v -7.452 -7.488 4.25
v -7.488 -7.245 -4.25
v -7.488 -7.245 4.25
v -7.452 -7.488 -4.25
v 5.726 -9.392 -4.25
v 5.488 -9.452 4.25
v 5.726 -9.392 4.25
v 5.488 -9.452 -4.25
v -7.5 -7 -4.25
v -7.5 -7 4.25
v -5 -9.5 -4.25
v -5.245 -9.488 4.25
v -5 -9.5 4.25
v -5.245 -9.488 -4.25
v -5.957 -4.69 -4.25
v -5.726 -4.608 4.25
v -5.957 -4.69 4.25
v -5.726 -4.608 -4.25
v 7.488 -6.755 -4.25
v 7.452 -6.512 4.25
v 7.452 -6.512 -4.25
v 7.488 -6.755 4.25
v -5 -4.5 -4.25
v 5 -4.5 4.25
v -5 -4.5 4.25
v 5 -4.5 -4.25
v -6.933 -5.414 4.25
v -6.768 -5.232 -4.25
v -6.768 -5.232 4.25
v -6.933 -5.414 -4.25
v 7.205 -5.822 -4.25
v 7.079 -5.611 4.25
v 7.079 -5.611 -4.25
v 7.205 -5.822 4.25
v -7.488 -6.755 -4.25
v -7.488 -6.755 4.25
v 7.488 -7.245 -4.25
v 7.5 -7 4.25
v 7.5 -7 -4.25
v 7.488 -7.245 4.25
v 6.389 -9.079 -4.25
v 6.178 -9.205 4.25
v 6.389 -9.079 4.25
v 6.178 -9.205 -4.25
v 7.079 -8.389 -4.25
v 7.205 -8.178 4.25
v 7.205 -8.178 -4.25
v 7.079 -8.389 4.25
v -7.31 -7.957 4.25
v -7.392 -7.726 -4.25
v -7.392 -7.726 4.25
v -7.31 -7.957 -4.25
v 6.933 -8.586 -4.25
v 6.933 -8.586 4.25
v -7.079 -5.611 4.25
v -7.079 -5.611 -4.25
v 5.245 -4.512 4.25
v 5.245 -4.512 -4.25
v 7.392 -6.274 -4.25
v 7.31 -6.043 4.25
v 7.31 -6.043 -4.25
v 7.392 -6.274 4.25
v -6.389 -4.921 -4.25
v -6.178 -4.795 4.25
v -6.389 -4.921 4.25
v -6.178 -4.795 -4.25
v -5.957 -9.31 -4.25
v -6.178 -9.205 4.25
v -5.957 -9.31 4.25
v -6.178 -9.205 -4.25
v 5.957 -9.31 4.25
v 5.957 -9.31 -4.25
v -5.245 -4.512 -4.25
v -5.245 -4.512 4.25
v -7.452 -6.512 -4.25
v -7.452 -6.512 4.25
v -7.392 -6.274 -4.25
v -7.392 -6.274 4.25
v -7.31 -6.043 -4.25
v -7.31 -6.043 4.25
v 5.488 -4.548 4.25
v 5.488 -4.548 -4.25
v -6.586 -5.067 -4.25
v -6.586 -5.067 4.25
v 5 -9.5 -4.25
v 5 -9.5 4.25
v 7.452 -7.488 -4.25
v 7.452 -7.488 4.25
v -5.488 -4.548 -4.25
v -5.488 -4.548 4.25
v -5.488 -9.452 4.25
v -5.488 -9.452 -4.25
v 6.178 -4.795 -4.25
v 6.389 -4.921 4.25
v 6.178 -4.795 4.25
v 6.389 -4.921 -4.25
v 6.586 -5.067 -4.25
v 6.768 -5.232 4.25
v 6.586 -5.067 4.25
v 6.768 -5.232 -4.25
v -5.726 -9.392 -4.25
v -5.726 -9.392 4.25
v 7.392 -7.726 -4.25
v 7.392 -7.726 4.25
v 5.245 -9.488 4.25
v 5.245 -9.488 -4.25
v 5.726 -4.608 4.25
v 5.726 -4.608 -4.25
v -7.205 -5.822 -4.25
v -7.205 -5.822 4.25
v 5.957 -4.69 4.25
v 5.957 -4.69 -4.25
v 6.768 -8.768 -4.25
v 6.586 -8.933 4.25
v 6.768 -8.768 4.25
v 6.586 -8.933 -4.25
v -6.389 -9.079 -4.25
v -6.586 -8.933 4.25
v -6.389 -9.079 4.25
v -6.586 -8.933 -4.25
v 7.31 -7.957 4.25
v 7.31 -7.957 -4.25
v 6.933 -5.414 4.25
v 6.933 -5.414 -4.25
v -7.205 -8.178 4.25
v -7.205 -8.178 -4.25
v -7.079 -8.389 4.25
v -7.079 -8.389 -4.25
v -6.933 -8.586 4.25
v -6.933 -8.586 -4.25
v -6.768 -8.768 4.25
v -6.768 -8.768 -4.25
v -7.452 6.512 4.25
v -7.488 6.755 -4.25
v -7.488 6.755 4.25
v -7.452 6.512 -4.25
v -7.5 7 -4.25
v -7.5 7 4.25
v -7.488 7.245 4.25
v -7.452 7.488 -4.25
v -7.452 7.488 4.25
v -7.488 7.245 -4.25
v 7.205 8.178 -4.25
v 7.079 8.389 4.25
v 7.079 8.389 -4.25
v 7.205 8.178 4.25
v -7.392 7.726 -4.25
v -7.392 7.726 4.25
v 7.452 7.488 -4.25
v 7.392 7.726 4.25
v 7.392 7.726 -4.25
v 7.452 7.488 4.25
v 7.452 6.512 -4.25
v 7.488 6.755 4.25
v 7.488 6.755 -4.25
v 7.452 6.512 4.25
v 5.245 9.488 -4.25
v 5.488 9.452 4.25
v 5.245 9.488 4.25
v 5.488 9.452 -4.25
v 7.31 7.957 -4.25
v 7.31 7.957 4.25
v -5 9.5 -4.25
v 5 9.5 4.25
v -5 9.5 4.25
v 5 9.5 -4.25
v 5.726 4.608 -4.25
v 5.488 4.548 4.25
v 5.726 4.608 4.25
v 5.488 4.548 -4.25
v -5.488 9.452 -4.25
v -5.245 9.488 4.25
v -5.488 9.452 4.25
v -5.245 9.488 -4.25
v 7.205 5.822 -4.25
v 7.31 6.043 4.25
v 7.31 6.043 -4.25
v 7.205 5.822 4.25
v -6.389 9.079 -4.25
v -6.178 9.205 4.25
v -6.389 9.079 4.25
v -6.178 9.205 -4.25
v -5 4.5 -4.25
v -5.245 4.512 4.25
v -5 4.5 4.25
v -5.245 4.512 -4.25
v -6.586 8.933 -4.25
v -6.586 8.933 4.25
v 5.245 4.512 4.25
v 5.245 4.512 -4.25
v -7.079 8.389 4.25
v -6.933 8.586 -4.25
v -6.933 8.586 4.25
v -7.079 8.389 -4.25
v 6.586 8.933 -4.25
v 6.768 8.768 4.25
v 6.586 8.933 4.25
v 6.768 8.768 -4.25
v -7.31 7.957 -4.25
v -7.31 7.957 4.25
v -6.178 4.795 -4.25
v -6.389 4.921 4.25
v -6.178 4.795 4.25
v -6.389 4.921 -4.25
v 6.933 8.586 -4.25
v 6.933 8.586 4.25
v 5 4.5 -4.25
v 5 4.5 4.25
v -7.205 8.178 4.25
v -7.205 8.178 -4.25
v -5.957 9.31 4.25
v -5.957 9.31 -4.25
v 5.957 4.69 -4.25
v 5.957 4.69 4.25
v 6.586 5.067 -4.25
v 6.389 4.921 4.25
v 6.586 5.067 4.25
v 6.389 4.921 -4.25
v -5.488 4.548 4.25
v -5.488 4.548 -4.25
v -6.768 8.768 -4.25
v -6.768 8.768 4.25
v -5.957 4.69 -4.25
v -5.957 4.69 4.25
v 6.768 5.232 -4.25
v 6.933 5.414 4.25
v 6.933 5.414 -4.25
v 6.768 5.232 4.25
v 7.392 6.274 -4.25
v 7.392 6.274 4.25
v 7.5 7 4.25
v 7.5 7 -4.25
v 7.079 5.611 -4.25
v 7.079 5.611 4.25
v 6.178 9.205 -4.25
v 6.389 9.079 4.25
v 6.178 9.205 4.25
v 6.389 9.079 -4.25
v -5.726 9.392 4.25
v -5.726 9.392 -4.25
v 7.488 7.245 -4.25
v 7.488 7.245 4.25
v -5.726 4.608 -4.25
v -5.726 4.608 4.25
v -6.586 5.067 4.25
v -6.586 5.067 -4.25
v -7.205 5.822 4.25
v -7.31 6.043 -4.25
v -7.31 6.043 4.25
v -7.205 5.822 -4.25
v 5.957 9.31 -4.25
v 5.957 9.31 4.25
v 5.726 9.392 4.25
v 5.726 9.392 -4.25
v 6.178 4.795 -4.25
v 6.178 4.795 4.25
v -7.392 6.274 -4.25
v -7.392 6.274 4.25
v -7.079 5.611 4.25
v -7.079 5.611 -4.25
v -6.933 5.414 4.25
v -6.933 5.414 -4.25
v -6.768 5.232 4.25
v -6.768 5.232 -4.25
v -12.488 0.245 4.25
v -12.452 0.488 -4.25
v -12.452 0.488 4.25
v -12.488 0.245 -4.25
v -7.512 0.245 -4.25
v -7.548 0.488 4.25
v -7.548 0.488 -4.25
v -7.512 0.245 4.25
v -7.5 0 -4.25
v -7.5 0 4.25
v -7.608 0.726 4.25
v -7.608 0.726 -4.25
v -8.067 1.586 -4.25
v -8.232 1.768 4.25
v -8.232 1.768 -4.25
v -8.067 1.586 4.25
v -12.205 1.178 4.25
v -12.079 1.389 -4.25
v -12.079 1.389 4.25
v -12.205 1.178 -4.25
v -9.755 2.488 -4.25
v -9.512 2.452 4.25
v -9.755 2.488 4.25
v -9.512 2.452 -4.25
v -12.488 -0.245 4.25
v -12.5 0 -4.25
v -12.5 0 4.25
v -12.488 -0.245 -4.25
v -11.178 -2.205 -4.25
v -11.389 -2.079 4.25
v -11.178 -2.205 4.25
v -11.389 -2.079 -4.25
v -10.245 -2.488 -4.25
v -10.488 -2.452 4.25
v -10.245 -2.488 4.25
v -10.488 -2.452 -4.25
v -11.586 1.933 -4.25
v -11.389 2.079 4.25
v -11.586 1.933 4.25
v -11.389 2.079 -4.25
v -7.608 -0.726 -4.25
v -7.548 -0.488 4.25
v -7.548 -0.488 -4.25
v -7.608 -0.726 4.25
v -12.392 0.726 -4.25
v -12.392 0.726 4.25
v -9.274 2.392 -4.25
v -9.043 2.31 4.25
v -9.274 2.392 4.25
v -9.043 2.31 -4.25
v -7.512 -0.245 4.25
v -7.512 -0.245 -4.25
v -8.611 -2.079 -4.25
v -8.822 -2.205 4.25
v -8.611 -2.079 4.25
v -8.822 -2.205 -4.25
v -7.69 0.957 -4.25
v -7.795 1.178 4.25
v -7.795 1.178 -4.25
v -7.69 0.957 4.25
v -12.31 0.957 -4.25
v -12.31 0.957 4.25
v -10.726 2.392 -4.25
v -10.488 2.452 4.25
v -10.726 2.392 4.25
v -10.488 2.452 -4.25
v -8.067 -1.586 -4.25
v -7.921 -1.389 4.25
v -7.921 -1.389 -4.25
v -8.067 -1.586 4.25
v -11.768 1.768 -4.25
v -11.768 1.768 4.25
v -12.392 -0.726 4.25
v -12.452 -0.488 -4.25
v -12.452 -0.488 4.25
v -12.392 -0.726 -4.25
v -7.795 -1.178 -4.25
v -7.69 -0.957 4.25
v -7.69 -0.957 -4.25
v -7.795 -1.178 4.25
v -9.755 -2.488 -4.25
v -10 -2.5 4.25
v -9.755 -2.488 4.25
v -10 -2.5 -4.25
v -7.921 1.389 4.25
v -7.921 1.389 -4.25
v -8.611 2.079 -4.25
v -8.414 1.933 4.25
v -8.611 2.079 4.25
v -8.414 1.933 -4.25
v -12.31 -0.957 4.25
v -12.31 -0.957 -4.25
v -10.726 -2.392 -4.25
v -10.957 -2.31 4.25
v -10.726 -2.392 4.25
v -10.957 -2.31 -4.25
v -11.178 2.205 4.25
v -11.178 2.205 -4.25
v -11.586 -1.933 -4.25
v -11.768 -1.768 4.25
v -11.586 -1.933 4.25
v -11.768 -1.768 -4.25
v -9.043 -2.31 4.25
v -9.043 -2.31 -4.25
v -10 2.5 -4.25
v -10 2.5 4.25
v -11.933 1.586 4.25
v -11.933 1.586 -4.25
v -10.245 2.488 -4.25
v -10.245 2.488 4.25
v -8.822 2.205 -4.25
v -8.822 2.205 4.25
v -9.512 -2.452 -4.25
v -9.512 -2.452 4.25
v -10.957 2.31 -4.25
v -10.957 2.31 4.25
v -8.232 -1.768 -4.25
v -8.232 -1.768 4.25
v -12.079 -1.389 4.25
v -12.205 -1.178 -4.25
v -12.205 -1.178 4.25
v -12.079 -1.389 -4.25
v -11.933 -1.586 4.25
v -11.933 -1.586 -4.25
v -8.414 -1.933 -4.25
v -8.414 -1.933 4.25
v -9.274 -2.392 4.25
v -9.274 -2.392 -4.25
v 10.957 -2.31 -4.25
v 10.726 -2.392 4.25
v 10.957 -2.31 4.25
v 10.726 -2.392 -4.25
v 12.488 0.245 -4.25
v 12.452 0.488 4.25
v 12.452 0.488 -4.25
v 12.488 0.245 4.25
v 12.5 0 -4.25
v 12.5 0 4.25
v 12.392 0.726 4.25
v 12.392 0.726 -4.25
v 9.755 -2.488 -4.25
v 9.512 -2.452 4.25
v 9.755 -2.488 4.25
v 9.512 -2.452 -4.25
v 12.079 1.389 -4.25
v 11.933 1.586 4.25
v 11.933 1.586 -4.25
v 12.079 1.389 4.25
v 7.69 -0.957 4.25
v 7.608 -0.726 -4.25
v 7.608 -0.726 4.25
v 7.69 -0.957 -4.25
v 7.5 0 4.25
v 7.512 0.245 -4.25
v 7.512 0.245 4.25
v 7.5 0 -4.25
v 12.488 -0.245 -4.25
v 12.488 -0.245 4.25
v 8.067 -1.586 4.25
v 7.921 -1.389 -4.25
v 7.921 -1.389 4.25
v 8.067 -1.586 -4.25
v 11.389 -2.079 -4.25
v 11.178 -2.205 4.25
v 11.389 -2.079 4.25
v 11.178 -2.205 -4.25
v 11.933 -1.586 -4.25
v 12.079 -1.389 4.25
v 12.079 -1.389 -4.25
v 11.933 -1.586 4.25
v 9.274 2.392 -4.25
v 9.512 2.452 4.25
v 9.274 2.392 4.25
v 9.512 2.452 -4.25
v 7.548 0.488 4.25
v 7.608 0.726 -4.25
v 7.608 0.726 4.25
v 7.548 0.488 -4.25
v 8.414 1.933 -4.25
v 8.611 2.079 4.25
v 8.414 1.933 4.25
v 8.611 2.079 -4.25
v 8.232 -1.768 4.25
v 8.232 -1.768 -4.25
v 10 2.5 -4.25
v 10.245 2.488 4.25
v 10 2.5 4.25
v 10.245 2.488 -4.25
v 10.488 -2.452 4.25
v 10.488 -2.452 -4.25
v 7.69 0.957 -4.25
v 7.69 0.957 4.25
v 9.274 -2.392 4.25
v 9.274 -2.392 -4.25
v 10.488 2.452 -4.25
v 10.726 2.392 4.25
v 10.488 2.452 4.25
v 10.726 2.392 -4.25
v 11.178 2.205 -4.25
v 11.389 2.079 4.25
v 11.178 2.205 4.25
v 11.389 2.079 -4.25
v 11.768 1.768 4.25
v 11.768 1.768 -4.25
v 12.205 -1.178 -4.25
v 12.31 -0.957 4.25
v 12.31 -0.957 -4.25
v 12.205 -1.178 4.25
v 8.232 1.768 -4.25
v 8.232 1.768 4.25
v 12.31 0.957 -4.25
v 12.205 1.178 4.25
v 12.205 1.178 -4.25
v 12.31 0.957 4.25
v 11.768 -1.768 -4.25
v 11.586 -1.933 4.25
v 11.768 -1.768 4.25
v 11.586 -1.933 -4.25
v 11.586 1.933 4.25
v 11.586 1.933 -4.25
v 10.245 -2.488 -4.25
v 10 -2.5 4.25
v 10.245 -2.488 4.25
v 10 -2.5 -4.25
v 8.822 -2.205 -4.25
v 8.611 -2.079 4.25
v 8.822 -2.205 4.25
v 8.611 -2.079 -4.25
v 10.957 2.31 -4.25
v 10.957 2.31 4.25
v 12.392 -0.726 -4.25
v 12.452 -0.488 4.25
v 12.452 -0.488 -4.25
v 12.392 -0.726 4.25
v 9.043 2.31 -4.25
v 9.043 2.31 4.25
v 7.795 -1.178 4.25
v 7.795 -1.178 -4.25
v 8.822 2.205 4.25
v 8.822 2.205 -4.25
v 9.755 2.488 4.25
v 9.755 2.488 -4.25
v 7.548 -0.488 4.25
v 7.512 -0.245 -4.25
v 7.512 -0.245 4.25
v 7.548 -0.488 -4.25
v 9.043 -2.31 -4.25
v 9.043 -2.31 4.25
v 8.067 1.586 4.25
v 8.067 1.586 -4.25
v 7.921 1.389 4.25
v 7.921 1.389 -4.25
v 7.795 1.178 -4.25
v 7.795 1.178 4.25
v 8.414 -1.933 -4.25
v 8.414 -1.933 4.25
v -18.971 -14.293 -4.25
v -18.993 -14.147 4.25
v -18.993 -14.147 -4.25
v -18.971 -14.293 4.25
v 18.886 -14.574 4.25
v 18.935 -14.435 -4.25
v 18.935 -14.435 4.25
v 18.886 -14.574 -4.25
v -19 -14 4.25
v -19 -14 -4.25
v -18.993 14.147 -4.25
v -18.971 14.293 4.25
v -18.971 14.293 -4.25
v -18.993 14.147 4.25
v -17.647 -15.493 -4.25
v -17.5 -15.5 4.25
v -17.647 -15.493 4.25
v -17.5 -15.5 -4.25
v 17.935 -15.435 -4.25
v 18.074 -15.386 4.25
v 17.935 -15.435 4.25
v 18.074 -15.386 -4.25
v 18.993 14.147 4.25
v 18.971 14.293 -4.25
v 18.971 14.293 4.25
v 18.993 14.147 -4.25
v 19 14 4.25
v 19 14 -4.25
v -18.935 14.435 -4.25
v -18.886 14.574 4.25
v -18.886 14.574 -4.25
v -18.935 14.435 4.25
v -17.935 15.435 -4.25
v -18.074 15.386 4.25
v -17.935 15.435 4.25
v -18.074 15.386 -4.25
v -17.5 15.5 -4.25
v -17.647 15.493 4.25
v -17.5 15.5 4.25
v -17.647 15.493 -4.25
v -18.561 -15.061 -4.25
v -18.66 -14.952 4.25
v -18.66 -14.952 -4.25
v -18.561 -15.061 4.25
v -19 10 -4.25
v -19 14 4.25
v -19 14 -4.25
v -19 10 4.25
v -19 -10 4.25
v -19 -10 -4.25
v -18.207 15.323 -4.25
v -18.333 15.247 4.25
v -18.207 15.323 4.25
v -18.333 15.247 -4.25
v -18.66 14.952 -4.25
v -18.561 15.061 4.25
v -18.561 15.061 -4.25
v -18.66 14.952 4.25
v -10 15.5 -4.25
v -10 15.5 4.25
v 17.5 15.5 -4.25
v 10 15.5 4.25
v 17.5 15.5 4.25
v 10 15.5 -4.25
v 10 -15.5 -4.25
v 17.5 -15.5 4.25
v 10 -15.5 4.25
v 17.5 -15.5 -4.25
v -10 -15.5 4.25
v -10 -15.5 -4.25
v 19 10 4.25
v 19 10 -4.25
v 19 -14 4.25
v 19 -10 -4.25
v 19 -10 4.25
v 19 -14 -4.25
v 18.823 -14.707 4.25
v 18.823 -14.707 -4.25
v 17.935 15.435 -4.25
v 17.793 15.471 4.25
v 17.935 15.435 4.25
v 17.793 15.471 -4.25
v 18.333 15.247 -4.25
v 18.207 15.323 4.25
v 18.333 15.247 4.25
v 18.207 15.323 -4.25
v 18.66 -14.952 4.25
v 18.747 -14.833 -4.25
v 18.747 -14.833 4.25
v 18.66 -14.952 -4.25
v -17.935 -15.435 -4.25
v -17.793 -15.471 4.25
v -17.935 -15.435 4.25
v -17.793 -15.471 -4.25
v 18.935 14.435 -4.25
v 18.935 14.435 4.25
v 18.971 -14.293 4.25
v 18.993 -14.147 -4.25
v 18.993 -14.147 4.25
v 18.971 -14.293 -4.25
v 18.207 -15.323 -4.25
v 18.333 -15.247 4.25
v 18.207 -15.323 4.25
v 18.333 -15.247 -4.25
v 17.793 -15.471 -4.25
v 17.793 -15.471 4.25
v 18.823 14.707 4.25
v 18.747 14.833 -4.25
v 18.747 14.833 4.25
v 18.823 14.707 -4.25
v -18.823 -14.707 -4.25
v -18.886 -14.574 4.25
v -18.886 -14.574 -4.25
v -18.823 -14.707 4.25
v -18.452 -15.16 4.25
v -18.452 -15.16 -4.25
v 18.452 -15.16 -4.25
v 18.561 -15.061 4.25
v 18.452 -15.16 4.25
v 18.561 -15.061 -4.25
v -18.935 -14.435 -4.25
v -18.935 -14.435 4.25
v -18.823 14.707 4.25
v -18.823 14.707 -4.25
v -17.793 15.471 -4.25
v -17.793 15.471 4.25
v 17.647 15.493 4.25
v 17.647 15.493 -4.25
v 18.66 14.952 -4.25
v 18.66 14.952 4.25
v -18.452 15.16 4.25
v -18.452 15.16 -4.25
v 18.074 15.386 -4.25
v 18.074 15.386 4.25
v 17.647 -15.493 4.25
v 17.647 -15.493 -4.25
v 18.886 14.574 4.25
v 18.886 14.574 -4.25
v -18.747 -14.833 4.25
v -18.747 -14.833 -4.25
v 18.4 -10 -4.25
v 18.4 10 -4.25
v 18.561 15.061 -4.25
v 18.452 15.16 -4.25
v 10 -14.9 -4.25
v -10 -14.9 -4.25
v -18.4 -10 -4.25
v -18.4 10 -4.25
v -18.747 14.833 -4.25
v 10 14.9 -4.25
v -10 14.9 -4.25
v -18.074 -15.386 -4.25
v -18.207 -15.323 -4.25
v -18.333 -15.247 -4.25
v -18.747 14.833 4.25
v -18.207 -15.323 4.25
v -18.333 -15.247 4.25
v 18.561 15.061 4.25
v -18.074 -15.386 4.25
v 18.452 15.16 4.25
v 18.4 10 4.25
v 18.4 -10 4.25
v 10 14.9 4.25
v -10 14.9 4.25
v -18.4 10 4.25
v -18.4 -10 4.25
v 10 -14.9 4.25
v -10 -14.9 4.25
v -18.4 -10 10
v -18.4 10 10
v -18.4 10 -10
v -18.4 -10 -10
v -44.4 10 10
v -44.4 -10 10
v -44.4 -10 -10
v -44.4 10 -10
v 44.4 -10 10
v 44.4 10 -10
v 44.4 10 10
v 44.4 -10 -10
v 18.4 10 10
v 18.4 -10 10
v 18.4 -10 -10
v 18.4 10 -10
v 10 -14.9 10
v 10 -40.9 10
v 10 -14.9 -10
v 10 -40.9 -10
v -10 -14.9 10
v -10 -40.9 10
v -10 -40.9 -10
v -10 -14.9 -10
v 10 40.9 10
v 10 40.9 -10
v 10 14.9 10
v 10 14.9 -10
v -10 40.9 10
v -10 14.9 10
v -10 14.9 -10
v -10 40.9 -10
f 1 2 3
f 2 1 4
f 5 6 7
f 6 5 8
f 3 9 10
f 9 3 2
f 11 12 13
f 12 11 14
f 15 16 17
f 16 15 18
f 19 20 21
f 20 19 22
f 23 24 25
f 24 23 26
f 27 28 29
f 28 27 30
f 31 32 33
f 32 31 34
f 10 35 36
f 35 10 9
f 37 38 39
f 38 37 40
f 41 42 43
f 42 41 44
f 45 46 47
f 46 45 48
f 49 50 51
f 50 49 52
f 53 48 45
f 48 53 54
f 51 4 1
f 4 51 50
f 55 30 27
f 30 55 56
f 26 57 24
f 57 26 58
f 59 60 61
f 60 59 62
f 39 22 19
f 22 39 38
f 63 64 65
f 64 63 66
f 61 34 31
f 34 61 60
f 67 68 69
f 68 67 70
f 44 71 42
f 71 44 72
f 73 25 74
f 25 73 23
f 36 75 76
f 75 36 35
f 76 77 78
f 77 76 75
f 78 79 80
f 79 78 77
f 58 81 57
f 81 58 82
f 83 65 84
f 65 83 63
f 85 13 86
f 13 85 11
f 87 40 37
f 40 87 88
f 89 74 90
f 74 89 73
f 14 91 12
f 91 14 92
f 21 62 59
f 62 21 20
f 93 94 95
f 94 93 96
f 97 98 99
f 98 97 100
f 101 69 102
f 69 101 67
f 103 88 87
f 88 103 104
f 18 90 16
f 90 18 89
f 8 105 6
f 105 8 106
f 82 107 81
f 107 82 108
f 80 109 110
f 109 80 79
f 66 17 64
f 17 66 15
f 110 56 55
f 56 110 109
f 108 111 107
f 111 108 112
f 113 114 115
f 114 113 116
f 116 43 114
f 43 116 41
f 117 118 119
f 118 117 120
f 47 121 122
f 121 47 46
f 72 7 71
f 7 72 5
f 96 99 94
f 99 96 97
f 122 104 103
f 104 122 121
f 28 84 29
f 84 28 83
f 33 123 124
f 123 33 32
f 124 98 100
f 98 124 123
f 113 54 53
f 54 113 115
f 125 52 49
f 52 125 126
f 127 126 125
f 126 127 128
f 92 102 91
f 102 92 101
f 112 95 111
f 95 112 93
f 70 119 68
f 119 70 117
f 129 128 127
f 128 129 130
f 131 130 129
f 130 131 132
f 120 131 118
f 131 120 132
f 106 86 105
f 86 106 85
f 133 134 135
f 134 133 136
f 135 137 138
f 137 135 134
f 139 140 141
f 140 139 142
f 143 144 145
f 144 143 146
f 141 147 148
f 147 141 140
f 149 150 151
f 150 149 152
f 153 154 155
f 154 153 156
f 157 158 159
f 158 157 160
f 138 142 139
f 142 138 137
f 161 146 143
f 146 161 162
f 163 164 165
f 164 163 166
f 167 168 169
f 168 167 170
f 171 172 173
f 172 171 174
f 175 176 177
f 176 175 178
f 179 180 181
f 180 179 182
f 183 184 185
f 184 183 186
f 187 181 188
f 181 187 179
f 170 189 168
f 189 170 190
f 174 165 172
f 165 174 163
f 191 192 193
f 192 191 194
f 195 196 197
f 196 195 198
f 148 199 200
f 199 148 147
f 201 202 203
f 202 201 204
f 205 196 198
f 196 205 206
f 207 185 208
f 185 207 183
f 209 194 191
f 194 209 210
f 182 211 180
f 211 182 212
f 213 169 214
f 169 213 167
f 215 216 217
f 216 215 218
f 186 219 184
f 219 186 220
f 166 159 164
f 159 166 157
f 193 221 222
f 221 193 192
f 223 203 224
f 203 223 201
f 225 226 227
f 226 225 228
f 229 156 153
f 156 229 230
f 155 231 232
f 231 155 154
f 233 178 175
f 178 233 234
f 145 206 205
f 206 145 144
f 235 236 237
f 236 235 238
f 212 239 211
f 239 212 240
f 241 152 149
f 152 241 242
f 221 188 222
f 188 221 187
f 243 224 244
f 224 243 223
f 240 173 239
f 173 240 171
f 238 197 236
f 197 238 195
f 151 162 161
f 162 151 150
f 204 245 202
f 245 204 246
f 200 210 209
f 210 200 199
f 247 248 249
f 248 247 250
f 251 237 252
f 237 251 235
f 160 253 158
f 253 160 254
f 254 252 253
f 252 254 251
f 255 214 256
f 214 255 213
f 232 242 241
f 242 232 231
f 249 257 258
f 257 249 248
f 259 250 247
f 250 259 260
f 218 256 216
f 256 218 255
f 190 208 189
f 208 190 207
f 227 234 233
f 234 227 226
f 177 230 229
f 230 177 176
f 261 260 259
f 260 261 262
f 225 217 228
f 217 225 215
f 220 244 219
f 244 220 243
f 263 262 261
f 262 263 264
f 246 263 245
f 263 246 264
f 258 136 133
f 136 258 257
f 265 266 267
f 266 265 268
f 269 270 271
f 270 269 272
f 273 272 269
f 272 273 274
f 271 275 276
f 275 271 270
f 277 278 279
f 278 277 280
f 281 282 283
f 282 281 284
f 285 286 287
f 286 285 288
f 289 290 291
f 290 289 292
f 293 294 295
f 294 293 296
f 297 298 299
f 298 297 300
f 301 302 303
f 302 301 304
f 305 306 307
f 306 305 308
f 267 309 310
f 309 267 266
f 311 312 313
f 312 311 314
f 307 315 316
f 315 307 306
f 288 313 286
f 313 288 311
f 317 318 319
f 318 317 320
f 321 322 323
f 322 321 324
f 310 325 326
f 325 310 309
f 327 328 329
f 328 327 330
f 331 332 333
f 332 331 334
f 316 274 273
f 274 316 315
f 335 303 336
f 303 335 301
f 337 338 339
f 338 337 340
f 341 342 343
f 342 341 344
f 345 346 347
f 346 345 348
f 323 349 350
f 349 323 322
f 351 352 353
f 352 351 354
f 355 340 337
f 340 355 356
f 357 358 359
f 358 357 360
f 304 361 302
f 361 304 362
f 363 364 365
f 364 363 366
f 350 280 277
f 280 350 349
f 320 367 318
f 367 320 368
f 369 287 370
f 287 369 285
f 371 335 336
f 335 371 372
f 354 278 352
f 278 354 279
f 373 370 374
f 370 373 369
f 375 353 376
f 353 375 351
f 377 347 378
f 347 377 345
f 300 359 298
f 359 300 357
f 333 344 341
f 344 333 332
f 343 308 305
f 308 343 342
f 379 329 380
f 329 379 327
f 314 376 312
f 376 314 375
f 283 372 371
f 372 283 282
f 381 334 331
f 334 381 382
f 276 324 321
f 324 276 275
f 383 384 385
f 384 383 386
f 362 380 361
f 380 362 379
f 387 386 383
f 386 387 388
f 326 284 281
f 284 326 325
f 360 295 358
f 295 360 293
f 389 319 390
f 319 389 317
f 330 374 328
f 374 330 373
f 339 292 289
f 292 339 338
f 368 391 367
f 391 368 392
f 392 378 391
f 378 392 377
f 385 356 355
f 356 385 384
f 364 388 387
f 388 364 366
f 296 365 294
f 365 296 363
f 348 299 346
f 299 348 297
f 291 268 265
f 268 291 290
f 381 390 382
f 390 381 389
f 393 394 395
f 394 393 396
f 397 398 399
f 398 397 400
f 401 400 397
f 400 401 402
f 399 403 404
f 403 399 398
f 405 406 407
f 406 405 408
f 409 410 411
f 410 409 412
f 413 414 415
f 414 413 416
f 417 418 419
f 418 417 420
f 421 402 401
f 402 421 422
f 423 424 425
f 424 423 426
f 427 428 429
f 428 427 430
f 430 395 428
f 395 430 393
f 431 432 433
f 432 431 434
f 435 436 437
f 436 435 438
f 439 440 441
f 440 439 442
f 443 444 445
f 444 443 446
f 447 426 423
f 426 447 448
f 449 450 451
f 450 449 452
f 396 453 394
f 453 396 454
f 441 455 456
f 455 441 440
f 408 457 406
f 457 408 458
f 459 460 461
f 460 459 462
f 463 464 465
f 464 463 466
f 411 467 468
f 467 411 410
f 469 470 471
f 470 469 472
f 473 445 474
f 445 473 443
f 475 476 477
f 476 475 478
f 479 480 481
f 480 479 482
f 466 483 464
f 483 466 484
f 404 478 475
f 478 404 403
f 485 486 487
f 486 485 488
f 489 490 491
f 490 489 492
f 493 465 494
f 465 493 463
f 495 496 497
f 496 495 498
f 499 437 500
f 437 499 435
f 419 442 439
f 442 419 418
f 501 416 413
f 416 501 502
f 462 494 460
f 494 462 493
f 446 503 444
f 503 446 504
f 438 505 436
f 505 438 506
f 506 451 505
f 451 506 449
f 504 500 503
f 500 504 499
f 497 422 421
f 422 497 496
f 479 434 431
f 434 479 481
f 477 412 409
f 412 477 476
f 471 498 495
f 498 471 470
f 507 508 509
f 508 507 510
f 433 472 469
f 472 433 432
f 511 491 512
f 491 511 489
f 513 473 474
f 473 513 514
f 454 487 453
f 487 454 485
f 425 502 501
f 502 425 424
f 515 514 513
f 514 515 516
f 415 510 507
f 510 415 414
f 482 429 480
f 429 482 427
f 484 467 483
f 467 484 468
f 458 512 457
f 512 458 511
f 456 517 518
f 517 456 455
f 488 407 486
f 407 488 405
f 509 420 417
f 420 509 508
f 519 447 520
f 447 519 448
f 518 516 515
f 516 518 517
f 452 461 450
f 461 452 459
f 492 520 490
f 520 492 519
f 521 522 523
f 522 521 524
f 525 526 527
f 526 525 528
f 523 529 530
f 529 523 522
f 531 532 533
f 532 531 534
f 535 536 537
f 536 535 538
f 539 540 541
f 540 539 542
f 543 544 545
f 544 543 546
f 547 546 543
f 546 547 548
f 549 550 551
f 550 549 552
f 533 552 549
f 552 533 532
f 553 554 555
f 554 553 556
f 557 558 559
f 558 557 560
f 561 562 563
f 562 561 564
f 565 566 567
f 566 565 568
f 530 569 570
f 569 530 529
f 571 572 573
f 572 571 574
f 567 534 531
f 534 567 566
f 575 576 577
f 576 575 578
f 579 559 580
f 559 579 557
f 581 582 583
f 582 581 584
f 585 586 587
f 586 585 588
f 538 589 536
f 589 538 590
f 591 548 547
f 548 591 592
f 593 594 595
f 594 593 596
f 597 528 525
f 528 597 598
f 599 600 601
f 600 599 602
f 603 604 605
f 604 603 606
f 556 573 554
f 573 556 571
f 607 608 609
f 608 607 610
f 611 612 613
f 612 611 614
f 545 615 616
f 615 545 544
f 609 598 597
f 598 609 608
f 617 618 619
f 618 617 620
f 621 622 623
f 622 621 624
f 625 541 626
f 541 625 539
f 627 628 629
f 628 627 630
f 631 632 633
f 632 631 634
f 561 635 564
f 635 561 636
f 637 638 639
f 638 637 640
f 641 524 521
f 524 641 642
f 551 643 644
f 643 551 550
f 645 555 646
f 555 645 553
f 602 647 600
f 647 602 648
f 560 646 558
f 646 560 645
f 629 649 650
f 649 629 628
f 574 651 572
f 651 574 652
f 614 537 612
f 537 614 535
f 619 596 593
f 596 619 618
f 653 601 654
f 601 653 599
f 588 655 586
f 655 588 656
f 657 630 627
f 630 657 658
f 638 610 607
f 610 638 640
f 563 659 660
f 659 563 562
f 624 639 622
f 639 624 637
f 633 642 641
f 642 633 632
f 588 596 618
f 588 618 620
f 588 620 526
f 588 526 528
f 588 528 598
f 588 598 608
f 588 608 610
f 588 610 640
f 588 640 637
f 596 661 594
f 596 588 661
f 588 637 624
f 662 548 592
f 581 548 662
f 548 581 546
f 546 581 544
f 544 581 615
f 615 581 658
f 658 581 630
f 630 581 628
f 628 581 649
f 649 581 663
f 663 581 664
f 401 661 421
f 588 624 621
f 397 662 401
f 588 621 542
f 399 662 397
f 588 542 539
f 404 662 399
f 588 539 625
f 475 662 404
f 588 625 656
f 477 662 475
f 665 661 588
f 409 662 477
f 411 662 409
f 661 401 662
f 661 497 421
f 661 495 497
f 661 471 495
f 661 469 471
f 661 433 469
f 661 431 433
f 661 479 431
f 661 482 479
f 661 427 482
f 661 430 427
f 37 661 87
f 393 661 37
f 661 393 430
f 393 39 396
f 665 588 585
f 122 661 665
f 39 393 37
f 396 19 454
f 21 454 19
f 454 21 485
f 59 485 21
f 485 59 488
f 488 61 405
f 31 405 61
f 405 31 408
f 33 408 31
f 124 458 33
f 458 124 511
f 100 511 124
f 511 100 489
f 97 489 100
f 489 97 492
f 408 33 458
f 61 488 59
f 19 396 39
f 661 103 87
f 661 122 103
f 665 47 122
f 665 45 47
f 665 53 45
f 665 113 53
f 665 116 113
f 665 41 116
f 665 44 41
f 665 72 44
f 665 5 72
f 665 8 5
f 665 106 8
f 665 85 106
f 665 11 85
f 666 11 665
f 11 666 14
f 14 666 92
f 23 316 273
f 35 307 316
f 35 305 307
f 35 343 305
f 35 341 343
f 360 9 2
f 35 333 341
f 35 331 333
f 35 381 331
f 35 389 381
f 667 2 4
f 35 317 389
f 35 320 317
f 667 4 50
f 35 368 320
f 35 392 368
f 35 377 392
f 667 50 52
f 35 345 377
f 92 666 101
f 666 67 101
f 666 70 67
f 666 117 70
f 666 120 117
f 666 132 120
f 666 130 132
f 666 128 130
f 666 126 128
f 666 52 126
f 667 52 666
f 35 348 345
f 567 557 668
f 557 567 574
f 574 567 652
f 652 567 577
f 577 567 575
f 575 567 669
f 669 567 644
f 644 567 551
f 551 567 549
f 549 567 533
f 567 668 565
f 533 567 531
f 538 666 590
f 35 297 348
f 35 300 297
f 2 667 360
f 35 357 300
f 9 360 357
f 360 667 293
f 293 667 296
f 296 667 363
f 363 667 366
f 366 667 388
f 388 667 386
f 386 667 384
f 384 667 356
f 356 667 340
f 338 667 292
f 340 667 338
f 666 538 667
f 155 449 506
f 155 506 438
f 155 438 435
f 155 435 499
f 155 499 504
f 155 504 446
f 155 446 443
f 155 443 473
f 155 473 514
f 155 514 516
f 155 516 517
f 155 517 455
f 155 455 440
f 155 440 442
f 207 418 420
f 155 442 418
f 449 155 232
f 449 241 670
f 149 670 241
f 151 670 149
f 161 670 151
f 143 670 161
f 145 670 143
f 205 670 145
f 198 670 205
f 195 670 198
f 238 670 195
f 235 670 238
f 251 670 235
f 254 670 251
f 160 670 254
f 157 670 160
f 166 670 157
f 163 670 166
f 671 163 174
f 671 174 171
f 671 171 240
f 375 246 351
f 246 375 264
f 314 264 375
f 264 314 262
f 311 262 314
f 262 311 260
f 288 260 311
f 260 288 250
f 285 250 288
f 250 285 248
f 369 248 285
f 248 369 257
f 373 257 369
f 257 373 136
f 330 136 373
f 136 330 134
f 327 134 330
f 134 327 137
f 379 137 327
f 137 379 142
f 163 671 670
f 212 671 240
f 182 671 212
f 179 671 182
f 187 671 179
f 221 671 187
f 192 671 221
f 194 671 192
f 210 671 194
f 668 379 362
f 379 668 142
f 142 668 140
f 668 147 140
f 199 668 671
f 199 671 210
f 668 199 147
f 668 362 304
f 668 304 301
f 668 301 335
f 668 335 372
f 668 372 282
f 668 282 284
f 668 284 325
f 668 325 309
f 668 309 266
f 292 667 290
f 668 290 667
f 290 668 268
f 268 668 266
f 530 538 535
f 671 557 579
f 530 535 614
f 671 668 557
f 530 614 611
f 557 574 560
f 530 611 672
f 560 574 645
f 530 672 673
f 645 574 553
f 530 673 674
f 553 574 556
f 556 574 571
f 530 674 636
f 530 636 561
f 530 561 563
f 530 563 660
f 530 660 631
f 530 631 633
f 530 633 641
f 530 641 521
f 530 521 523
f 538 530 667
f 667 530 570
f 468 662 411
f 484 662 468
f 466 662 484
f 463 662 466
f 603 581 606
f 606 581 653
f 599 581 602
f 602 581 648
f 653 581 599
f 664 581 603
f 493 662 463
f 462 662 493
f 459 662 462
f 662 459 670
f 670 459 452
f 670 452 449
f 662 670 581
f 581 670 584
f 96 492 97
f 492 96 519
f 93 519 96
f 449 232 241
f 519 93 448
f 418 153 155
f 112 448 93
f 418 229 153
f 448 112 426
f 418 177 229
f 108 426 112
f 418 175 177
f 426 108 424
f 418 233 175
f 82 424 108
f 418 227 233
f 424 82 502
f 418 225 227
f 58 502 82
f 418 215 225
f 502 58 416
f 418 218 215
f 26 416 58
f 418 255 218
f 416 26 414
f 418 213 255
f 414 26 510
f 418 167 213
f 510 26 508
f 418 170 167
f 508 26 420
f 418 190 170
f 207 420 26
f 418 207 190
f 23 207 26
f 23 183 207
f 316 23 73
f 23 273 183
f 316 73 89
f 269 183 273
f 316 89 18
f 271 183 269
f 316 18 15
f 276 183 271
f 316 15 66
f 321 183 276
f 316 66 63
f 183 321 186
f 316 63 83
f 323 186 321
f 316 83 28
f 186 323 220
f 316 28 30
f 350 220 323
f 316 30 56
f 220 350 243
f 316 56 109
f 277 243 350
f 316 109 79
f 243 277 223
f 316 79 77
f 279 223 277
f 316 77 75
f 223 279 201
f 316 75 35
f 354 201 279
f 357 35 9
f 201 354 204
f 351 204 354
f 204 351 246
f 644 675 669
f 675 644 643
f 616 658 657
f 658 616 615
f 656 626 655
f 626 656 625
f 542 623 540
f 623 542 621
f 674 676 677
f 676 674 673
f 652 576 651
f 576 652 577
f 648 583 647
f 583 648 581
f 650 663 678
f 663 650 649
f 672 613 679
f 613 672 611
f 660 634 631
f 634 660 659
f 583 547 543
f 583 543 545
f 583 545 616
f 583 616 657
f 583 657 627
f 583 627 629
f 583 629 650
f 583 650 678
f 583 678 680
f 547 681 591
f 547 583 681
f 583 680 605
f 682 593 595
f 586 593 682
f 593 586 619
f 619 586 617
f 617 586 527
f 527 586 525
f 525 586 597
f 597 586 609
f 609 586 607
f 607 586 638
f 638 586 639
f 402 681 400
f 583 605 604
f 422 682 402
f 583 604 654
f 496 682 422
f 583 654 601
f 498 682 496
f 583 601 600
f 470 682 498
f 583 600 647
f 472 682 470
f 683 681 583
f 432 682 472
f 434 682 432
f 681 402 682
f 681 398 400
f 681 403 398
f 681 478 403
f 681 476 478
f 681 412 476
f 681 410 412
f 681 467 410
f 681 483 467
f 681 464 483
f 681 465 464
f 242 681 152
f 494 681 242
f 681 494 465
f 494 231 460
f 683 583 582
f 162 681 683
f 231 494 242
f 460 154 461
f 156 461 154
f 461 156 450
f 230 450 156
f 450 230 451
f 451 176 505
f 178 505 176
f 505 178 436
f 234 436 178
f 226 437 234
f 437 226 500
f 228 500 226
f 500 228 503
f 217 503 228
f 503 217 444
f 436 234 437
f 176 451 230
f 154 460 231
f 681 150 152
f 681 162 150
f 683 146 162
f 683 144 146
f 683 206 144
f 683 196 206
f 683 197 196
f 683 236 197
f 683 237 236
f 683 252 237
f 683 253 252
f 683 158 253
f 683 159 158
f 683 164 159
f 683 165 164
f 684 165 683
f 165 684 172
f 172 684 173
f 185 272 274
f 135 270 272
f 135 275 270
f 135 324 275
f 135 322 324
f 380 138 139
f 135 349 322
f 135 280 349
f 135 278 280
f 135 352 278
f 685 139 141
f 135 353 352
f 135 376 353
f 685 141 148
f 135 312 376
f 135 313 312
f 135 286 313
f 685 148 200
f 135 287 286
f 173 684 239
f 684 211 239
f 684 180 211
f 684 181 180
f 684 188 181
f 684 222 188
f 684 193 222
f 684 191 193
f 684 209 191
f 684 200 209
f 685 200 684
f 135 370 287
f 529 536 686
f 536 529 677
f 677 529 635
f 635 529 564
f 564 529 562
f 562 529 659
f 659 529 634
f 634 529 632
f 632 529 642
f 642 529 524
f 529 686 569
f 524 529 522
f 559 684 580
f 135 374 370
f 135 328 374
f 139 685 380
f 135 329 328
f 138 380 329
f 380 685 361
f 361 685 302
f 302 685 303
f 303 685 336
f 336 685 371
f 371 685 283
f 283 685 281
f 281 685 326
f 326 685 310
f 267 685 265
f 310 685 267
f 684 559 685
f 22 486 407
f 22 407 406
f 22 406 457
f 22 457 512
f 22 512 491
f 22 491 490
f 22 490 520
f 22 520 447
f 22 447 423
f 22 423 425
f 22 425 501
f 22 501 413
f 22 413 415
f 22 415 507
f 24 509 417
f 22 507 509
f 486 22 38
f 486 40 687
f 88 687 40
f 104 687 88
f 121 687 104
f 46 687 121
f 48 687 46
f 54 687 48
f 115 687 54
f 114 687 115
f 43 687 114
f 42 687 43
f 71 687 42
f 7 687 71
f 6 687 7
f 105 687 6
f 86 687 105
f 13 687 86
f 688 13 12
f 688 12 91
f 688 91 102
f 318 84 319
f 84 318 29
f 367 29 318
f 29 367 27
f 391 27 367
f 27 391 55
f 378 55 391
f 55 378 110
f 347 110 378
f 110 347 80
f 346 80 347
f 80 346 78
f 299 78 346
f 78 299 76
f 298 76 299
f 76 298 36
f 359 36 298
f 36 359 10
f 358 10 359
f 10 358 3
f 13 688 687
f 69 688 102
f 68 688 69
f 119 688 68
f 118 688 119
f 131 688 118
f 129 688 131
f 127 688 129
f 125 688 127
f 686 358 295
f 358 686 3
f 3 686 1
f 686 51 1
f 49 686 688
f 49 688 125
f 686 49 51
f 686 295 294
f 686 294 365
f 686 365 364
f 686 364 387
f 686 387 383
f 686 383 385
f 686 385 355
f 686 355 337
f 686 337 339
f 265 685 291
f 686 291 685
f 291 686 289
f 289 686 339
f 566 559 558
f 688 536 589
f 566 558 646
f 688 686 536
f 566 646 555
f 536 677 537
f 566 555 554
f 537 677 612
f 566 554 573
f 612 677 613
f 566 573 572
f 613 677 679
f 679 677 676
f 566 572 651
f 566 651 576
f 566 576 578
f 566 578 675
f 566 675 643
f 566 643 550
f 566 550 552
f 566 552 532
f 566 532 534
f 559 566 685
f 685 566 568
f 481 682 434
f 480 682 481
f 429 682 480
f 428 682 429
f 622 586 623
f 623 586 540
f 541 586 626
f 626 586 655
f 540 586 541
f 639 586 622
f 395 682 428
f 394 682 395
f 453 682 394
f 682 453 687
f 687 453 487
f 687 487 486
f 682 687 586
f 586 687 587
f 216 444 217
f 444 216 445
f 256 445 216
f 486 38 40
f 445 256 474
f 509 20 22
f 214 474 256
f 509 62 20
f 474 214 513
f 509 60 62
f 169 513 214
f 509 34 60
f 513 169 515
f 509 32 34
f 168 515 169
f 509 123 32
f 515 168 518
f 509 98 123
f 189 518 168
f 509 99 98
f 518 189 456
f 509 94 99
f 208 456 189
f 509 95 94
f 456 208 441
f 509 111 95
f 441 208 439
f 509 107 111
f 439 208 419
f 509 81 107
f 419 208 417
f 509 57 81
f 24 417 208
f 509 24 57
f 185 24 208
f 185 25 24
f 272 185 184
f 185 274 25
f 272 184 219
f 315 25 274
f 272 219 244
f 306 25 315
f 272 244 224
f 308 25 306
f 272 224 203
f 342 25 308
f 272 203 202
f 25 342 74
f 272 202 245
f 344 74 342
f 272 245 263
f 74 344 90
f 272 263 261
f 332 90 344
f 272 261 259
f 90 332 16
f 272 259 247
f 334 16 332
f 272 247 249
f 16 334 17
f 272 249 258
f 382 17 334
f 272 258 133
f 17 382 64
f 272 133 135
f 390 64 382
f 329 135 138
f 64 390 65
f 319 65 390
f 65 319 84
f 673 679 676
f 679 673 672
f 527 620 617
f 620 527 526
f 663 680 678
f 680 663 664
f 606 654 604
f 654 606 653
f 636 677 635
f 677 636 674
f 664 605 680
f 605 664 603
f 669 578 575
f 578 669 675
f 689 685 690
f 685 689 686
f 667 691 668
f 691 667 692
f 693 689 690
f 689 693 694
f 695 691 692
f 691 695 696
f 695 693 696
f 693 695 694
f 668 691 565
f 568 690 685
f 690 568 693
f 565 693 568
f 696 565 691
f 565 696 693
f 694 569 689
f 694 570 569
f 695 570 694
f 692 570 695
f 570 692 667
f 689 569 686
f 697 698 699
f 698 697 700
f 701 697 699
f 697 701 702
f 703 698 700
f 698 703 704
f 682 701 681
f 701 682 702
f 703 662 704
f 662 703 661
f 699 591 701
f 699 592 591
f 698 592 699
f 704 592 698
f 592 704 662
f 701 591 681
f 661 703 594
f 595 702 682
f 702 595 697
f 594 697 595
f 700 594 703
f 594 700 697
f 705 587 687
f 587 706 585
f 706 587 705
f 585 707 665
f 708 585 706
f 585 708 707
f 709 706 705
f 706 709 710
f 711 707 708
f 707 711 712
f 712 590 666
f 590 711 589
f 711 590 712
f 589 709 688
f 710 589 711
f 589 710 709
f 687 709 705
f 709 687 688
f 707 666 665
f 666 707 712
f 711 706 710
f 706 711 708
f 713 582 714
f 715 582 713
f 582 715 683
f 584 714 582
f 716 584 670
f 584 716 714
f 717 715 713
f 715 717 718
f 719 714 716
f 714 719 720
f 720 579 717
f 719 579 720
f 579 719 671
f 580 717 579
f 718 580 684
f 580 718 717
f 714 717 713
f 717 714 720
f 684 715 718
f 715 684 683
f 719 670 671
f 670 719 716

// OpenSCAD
// A extrusion bracket target size: [38, 31, 8.5]
// One connected solid (bracket + short extrusion stubs), with visible slots/holes.
// All placements are formula-based (no arbitrary offsets).

$fn = 64;

// Parameters
overall_length = 38;          // X
overall_width  = 31;          // Y
overall_thickness = 8.5;      // Z

hole_diameter = 5;
slot_length = 10;
slot_width  = 5;

corner_radius = 1.5;          // outer corner rounding
hole_edge_margin = 7;         // min edge margin for hole centers
slot_spacing_y = 14;          // distance between slot centerlines (Y)
attach_hole_spacing_x = 20;   // distance between hole centers (X)

overlap = 0.6;                // small overlap to ensure watertight unions/differences

// Simple extrusion stubs (for context + guaranteed connectivity)
extrusion_size = 20;
extrusion_stub_len = 26;      // short stubs so bracket remains clearly visible

// ---------- Helpers ----------
module rounded_plate_2d(L, W, r) {
  r2 = min(r, min(L, W)/2);
  hull() {
    for (sx = [-1, 1], sy = [-1, 1])
      translate([sx*(L/2 - r2), sy*(W/2 - r2)]) circle(r=r2);
  }
}

module slot_2d(len, wid) {
  hull() {
    translate([-len/2, 0]) circle(r=wid/2);
    translate([ len/2, 0]) circle(r=wid/2);
  }
}

// ---------- Bracket ----------
module extrusion_bracket() {
  // Clamp feature positions so they always stay inside the plate
  x_hole = min(attach_hole_spacing_x/2, overall_length/2 - hole_edge_margin);
  y_slot = min(slot_spacing_y/2, overall_width/2 - hole_edge_margin);

  difference() {
    // Main plate with rounded corners
    linear_extrude(height=overall_thickness, center=true)
      rounded_plate_2d(overall_length, overall_width, corner_radius);

    // Through slots (two)
    for (sy = [-1, 1]) {
      translate([0, sy*y_slot, 0])
        linear_extrude(height=overall_thickness + 2*overlap, center=true)
          slot_2d(slot_length, slot_width);
    }

    // Through holes (two)
    for (sx = [-1, 1]) {
      translate([sx*x_hole, 0, 0])
        cylinder(h=overall_thickness + 2*overlap, r=hole_diameter/2, center=true);
    }
  }
}

// ---------- Extrusion stubs (connected to bracket) ----------
module extrusion_stubs_connected() {
  // Place stubs so they intersect the bracket slightly (overlap) to ensure one solid.
  // Stubs extend outward from the bracket edges in X and Y directions.
  x_pos = overall_length/2 + extrusion_stub_len/2 - overlap;
  y_pos = overall_width/2  + extrusion_stub_len/2 - overlap;
  z_pos = 0;

  union() {
    // X-direction stubs
    for (sx = [-1, 1])
      translate([sx*x_pos, 0, z_pos])
        cube([extrusion_stub_len, extrusion_size, extrusion_size], center=true);

    // Y-direction stubs
    for (sy = [-1, 1])
      translate([0, sy*y_pos, z_pos])
        cube([extrusion_size, extrusion_stub_len, extrusion_size], center=true);
  }
}

// ---------- Assembly (ONE connected solid) ----------
union() {
  extrusion_bracket();
  extrusion_stubs_connected();
}
